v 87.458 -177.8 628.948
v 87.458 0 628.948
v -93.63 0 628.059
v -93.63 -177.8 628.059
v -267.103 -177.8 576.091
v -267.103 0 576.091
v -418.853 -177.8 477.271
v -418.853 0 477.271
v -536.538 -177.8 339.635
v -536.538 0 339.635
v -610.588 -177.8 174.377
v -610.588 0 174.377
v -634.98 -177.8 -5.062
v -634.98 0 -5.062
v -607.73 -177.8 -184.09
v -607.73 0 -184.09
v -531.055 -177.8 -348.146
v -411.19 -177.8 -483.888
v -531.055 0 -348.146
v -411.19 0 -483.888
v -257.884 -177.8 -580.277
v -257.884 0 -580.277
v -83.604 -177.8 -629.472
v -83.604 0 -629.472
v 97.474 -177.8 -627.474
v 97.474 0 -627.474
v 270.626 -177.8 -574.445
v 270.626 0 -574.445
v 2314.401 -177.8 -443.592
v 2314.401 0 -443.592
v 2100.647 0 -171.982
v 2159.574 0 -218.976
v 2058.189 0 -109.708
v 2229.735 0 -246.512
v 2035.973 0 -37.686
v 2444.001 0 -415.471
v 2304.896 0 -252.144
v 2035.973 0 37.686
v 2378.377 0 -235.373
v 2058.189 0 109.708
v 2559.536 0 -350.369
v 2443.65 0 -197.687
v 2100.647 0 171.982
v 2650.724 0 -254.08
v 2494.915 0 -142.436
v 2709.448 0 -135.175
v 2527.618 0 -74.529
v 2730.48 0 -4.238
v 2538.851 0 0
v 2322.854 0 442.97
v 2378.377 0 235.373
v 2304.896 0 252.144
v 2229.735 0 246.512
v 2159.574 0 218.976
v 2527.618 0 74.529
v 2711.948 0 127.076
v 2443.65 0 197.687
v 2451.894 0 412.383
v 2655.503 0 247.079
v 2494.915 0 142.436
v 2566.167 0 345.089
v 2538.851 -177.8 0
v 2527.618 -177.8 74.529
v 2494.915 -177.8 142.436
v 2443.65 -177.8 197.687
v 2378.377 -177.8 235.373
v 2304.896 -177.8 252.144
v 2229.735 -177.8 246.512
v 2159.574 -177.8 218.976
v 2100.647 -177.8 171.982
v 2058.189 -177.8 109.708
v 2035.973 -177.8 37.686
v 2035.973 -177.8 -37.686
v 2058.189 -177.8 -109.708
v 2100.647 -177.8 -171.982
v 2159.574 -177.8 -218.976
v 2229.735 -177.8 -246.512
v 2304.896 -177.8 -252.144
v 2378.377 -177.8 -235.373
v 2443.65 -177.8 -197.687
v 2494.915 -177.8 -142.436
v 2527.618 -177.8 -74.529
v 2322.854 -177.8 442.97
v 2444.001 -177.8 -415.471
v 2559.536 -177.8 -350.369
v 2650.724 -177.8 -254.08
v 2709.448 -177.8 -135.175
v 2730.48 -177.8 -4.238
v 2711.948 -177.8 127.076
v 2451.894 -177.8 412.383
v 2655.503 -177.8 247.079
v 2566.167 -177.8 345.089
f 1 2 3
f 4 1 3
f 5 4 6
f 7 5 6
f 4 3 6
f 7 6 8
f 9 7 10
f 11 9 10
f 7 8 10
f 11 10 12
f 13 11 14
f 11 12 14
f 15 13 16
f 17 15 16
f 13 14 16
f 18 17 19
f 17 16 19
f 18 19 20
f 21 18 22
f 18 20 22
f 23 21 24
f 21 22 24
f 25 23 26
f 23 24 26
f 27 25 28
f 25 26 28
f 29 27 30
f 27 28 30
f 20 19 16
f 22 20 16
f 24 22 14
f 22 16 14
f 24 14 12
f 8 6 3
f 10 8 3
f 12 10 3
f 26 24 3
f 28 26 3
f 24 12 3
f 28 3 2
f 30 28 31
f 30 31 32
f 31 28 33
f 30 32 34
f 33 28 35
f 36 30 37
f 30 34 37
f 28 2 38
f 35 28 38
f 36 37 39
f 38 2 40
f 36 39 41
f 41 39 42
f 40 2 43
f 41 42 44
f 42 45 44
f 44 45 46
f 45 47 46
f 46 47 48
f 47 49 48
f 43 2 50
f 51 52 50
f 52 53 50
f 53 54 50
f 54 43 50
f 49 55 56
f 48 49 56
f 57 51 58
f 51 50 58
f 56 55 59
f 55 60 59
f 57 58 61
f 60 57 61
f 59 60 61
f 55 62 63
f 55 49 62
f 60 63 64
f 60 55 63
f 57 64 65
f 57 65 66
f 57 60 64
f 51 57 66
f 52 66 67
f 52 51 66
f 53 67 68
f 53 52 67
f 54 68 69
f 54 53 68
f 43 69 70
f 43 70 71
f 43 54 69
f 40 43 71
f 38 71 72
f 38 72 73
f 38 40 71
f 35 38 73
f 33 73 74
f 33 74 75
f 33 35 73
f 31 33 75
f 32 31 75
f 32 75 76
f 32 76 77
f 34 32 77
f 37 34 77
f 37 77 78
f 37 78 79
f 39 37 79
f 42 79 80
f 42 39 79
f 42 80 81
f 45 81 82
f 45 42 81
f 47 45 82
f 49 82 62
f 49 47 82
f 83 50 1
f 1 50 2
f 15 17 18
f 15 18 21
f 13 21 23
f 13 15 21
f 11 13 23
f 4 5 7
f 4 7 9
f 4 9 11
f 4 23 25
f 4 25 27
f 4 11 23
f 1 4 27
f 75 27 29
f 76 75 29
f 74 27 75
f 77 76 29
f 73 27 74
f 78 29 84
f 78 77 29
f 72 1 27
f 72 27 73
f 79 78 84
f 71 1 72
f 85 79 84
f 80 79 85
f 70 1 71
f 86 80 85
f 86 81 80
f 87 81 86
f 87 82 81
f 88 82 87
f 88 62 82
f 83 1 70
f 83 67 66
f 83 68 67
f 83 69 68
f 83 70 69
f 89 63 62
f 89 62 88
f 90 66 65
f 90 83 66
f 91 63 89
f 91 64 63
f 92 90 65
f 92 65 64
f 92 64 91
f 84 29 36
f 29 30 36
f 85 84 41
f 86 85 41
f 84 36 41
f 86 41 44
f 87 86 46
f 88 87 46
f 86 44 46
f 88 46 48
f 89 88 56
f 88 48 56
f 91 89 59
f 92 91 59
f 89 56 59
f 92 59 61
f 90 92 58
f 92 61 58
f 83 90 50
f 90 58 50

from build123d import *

# Parameters (mm, degrees)
F0_R     = 355.7076879014
F0_R_2   = 252.8511966315
F1_DEPTH = 50.8
F2_DEPTH = 127


with BuildPart() as f1:
    # F0 (on Front) → F1 (new body)
    with BuildSketch(Plane.XZ):
        with BuildLine():
            ThreePointArc((270.6258134175, -574.444661488), (536.2240163962, -340.1305693994), (635, 0))
            ThreePointArc((635, 0), (478.9366700197, 416.9468384704), (87.457744534, 628.9484421803))
            ThreePointArc((87.457744534, 628.9484421803), (-618.9545112294, 141.846089226), (-195.1587040305, -604.2665638947))
            Line((-195.1587040305, -604.2665638947), (270.6258134175, -574.444661488))
        make_face()
        Circle(F0_R, mode=Mode.SUBTRACT)
        with BuildLine():
            ThreePointArc((87.457744534, 628.9484421803), (478.9366700197, 416.9468384704), (635, 0))
            ThreePointArc((635, 0), (536.2240163962, -340.1305693994), (270.6258134175, -574.444661488))
            Line((270.6258134175, -574.444661488), (2314.4010075815, -443.5917410957))
            ThreePointArc((2314.4010075815, -443.5917410957), (1841.5202023269, 4.2378603641), (2322.8538620739, 442.9695732782))
            Line((2322.8538620739, 442.9695732782), (87.457744534, 628.9484421803))
        make_face()
        with BuildLine():
            ThreePointArc((-195.1587040305, -604.2665638947), (40.5728679735, -633.7024872796), (270.6258134175, -574.444661488))
            Line((270.6258134175, -574.444661488), (-195.1587040305, -604.2665638947))
        make_face()
        with BuildLine():
            ThreePointArc((2730.5, 0), (2613.0793418208, 300.9972660243), (2322.8538620739, 442.9695732782))
            ThreePointArc((2322.8538620739, 442.9695732782), (1841.5202023269, 4.2378603641), (2314.4010075815, -443.5917410957))
            ThreePointArc((2314.4010075815, -443.5917410957), (2610.1947700611, -304.101958338), (2730.5, 0))
        make_face()
        with Locations((2286, 0)):
            Circle(F0_R_2, mode=Mode.SUBTRACT)
        Circle(F0_R)
    extrude(amount=F1_DEPTH)

    # F2 (add): a face of the model
    f2_faces = [f1.faces().sort_by_distance(p)[0] for p in [
        (870.0059468679, -50.8, 7.3992180839),
    ]]
    extrude(f2_faces, amount=F2_DEPTH)


solid = f1.part
